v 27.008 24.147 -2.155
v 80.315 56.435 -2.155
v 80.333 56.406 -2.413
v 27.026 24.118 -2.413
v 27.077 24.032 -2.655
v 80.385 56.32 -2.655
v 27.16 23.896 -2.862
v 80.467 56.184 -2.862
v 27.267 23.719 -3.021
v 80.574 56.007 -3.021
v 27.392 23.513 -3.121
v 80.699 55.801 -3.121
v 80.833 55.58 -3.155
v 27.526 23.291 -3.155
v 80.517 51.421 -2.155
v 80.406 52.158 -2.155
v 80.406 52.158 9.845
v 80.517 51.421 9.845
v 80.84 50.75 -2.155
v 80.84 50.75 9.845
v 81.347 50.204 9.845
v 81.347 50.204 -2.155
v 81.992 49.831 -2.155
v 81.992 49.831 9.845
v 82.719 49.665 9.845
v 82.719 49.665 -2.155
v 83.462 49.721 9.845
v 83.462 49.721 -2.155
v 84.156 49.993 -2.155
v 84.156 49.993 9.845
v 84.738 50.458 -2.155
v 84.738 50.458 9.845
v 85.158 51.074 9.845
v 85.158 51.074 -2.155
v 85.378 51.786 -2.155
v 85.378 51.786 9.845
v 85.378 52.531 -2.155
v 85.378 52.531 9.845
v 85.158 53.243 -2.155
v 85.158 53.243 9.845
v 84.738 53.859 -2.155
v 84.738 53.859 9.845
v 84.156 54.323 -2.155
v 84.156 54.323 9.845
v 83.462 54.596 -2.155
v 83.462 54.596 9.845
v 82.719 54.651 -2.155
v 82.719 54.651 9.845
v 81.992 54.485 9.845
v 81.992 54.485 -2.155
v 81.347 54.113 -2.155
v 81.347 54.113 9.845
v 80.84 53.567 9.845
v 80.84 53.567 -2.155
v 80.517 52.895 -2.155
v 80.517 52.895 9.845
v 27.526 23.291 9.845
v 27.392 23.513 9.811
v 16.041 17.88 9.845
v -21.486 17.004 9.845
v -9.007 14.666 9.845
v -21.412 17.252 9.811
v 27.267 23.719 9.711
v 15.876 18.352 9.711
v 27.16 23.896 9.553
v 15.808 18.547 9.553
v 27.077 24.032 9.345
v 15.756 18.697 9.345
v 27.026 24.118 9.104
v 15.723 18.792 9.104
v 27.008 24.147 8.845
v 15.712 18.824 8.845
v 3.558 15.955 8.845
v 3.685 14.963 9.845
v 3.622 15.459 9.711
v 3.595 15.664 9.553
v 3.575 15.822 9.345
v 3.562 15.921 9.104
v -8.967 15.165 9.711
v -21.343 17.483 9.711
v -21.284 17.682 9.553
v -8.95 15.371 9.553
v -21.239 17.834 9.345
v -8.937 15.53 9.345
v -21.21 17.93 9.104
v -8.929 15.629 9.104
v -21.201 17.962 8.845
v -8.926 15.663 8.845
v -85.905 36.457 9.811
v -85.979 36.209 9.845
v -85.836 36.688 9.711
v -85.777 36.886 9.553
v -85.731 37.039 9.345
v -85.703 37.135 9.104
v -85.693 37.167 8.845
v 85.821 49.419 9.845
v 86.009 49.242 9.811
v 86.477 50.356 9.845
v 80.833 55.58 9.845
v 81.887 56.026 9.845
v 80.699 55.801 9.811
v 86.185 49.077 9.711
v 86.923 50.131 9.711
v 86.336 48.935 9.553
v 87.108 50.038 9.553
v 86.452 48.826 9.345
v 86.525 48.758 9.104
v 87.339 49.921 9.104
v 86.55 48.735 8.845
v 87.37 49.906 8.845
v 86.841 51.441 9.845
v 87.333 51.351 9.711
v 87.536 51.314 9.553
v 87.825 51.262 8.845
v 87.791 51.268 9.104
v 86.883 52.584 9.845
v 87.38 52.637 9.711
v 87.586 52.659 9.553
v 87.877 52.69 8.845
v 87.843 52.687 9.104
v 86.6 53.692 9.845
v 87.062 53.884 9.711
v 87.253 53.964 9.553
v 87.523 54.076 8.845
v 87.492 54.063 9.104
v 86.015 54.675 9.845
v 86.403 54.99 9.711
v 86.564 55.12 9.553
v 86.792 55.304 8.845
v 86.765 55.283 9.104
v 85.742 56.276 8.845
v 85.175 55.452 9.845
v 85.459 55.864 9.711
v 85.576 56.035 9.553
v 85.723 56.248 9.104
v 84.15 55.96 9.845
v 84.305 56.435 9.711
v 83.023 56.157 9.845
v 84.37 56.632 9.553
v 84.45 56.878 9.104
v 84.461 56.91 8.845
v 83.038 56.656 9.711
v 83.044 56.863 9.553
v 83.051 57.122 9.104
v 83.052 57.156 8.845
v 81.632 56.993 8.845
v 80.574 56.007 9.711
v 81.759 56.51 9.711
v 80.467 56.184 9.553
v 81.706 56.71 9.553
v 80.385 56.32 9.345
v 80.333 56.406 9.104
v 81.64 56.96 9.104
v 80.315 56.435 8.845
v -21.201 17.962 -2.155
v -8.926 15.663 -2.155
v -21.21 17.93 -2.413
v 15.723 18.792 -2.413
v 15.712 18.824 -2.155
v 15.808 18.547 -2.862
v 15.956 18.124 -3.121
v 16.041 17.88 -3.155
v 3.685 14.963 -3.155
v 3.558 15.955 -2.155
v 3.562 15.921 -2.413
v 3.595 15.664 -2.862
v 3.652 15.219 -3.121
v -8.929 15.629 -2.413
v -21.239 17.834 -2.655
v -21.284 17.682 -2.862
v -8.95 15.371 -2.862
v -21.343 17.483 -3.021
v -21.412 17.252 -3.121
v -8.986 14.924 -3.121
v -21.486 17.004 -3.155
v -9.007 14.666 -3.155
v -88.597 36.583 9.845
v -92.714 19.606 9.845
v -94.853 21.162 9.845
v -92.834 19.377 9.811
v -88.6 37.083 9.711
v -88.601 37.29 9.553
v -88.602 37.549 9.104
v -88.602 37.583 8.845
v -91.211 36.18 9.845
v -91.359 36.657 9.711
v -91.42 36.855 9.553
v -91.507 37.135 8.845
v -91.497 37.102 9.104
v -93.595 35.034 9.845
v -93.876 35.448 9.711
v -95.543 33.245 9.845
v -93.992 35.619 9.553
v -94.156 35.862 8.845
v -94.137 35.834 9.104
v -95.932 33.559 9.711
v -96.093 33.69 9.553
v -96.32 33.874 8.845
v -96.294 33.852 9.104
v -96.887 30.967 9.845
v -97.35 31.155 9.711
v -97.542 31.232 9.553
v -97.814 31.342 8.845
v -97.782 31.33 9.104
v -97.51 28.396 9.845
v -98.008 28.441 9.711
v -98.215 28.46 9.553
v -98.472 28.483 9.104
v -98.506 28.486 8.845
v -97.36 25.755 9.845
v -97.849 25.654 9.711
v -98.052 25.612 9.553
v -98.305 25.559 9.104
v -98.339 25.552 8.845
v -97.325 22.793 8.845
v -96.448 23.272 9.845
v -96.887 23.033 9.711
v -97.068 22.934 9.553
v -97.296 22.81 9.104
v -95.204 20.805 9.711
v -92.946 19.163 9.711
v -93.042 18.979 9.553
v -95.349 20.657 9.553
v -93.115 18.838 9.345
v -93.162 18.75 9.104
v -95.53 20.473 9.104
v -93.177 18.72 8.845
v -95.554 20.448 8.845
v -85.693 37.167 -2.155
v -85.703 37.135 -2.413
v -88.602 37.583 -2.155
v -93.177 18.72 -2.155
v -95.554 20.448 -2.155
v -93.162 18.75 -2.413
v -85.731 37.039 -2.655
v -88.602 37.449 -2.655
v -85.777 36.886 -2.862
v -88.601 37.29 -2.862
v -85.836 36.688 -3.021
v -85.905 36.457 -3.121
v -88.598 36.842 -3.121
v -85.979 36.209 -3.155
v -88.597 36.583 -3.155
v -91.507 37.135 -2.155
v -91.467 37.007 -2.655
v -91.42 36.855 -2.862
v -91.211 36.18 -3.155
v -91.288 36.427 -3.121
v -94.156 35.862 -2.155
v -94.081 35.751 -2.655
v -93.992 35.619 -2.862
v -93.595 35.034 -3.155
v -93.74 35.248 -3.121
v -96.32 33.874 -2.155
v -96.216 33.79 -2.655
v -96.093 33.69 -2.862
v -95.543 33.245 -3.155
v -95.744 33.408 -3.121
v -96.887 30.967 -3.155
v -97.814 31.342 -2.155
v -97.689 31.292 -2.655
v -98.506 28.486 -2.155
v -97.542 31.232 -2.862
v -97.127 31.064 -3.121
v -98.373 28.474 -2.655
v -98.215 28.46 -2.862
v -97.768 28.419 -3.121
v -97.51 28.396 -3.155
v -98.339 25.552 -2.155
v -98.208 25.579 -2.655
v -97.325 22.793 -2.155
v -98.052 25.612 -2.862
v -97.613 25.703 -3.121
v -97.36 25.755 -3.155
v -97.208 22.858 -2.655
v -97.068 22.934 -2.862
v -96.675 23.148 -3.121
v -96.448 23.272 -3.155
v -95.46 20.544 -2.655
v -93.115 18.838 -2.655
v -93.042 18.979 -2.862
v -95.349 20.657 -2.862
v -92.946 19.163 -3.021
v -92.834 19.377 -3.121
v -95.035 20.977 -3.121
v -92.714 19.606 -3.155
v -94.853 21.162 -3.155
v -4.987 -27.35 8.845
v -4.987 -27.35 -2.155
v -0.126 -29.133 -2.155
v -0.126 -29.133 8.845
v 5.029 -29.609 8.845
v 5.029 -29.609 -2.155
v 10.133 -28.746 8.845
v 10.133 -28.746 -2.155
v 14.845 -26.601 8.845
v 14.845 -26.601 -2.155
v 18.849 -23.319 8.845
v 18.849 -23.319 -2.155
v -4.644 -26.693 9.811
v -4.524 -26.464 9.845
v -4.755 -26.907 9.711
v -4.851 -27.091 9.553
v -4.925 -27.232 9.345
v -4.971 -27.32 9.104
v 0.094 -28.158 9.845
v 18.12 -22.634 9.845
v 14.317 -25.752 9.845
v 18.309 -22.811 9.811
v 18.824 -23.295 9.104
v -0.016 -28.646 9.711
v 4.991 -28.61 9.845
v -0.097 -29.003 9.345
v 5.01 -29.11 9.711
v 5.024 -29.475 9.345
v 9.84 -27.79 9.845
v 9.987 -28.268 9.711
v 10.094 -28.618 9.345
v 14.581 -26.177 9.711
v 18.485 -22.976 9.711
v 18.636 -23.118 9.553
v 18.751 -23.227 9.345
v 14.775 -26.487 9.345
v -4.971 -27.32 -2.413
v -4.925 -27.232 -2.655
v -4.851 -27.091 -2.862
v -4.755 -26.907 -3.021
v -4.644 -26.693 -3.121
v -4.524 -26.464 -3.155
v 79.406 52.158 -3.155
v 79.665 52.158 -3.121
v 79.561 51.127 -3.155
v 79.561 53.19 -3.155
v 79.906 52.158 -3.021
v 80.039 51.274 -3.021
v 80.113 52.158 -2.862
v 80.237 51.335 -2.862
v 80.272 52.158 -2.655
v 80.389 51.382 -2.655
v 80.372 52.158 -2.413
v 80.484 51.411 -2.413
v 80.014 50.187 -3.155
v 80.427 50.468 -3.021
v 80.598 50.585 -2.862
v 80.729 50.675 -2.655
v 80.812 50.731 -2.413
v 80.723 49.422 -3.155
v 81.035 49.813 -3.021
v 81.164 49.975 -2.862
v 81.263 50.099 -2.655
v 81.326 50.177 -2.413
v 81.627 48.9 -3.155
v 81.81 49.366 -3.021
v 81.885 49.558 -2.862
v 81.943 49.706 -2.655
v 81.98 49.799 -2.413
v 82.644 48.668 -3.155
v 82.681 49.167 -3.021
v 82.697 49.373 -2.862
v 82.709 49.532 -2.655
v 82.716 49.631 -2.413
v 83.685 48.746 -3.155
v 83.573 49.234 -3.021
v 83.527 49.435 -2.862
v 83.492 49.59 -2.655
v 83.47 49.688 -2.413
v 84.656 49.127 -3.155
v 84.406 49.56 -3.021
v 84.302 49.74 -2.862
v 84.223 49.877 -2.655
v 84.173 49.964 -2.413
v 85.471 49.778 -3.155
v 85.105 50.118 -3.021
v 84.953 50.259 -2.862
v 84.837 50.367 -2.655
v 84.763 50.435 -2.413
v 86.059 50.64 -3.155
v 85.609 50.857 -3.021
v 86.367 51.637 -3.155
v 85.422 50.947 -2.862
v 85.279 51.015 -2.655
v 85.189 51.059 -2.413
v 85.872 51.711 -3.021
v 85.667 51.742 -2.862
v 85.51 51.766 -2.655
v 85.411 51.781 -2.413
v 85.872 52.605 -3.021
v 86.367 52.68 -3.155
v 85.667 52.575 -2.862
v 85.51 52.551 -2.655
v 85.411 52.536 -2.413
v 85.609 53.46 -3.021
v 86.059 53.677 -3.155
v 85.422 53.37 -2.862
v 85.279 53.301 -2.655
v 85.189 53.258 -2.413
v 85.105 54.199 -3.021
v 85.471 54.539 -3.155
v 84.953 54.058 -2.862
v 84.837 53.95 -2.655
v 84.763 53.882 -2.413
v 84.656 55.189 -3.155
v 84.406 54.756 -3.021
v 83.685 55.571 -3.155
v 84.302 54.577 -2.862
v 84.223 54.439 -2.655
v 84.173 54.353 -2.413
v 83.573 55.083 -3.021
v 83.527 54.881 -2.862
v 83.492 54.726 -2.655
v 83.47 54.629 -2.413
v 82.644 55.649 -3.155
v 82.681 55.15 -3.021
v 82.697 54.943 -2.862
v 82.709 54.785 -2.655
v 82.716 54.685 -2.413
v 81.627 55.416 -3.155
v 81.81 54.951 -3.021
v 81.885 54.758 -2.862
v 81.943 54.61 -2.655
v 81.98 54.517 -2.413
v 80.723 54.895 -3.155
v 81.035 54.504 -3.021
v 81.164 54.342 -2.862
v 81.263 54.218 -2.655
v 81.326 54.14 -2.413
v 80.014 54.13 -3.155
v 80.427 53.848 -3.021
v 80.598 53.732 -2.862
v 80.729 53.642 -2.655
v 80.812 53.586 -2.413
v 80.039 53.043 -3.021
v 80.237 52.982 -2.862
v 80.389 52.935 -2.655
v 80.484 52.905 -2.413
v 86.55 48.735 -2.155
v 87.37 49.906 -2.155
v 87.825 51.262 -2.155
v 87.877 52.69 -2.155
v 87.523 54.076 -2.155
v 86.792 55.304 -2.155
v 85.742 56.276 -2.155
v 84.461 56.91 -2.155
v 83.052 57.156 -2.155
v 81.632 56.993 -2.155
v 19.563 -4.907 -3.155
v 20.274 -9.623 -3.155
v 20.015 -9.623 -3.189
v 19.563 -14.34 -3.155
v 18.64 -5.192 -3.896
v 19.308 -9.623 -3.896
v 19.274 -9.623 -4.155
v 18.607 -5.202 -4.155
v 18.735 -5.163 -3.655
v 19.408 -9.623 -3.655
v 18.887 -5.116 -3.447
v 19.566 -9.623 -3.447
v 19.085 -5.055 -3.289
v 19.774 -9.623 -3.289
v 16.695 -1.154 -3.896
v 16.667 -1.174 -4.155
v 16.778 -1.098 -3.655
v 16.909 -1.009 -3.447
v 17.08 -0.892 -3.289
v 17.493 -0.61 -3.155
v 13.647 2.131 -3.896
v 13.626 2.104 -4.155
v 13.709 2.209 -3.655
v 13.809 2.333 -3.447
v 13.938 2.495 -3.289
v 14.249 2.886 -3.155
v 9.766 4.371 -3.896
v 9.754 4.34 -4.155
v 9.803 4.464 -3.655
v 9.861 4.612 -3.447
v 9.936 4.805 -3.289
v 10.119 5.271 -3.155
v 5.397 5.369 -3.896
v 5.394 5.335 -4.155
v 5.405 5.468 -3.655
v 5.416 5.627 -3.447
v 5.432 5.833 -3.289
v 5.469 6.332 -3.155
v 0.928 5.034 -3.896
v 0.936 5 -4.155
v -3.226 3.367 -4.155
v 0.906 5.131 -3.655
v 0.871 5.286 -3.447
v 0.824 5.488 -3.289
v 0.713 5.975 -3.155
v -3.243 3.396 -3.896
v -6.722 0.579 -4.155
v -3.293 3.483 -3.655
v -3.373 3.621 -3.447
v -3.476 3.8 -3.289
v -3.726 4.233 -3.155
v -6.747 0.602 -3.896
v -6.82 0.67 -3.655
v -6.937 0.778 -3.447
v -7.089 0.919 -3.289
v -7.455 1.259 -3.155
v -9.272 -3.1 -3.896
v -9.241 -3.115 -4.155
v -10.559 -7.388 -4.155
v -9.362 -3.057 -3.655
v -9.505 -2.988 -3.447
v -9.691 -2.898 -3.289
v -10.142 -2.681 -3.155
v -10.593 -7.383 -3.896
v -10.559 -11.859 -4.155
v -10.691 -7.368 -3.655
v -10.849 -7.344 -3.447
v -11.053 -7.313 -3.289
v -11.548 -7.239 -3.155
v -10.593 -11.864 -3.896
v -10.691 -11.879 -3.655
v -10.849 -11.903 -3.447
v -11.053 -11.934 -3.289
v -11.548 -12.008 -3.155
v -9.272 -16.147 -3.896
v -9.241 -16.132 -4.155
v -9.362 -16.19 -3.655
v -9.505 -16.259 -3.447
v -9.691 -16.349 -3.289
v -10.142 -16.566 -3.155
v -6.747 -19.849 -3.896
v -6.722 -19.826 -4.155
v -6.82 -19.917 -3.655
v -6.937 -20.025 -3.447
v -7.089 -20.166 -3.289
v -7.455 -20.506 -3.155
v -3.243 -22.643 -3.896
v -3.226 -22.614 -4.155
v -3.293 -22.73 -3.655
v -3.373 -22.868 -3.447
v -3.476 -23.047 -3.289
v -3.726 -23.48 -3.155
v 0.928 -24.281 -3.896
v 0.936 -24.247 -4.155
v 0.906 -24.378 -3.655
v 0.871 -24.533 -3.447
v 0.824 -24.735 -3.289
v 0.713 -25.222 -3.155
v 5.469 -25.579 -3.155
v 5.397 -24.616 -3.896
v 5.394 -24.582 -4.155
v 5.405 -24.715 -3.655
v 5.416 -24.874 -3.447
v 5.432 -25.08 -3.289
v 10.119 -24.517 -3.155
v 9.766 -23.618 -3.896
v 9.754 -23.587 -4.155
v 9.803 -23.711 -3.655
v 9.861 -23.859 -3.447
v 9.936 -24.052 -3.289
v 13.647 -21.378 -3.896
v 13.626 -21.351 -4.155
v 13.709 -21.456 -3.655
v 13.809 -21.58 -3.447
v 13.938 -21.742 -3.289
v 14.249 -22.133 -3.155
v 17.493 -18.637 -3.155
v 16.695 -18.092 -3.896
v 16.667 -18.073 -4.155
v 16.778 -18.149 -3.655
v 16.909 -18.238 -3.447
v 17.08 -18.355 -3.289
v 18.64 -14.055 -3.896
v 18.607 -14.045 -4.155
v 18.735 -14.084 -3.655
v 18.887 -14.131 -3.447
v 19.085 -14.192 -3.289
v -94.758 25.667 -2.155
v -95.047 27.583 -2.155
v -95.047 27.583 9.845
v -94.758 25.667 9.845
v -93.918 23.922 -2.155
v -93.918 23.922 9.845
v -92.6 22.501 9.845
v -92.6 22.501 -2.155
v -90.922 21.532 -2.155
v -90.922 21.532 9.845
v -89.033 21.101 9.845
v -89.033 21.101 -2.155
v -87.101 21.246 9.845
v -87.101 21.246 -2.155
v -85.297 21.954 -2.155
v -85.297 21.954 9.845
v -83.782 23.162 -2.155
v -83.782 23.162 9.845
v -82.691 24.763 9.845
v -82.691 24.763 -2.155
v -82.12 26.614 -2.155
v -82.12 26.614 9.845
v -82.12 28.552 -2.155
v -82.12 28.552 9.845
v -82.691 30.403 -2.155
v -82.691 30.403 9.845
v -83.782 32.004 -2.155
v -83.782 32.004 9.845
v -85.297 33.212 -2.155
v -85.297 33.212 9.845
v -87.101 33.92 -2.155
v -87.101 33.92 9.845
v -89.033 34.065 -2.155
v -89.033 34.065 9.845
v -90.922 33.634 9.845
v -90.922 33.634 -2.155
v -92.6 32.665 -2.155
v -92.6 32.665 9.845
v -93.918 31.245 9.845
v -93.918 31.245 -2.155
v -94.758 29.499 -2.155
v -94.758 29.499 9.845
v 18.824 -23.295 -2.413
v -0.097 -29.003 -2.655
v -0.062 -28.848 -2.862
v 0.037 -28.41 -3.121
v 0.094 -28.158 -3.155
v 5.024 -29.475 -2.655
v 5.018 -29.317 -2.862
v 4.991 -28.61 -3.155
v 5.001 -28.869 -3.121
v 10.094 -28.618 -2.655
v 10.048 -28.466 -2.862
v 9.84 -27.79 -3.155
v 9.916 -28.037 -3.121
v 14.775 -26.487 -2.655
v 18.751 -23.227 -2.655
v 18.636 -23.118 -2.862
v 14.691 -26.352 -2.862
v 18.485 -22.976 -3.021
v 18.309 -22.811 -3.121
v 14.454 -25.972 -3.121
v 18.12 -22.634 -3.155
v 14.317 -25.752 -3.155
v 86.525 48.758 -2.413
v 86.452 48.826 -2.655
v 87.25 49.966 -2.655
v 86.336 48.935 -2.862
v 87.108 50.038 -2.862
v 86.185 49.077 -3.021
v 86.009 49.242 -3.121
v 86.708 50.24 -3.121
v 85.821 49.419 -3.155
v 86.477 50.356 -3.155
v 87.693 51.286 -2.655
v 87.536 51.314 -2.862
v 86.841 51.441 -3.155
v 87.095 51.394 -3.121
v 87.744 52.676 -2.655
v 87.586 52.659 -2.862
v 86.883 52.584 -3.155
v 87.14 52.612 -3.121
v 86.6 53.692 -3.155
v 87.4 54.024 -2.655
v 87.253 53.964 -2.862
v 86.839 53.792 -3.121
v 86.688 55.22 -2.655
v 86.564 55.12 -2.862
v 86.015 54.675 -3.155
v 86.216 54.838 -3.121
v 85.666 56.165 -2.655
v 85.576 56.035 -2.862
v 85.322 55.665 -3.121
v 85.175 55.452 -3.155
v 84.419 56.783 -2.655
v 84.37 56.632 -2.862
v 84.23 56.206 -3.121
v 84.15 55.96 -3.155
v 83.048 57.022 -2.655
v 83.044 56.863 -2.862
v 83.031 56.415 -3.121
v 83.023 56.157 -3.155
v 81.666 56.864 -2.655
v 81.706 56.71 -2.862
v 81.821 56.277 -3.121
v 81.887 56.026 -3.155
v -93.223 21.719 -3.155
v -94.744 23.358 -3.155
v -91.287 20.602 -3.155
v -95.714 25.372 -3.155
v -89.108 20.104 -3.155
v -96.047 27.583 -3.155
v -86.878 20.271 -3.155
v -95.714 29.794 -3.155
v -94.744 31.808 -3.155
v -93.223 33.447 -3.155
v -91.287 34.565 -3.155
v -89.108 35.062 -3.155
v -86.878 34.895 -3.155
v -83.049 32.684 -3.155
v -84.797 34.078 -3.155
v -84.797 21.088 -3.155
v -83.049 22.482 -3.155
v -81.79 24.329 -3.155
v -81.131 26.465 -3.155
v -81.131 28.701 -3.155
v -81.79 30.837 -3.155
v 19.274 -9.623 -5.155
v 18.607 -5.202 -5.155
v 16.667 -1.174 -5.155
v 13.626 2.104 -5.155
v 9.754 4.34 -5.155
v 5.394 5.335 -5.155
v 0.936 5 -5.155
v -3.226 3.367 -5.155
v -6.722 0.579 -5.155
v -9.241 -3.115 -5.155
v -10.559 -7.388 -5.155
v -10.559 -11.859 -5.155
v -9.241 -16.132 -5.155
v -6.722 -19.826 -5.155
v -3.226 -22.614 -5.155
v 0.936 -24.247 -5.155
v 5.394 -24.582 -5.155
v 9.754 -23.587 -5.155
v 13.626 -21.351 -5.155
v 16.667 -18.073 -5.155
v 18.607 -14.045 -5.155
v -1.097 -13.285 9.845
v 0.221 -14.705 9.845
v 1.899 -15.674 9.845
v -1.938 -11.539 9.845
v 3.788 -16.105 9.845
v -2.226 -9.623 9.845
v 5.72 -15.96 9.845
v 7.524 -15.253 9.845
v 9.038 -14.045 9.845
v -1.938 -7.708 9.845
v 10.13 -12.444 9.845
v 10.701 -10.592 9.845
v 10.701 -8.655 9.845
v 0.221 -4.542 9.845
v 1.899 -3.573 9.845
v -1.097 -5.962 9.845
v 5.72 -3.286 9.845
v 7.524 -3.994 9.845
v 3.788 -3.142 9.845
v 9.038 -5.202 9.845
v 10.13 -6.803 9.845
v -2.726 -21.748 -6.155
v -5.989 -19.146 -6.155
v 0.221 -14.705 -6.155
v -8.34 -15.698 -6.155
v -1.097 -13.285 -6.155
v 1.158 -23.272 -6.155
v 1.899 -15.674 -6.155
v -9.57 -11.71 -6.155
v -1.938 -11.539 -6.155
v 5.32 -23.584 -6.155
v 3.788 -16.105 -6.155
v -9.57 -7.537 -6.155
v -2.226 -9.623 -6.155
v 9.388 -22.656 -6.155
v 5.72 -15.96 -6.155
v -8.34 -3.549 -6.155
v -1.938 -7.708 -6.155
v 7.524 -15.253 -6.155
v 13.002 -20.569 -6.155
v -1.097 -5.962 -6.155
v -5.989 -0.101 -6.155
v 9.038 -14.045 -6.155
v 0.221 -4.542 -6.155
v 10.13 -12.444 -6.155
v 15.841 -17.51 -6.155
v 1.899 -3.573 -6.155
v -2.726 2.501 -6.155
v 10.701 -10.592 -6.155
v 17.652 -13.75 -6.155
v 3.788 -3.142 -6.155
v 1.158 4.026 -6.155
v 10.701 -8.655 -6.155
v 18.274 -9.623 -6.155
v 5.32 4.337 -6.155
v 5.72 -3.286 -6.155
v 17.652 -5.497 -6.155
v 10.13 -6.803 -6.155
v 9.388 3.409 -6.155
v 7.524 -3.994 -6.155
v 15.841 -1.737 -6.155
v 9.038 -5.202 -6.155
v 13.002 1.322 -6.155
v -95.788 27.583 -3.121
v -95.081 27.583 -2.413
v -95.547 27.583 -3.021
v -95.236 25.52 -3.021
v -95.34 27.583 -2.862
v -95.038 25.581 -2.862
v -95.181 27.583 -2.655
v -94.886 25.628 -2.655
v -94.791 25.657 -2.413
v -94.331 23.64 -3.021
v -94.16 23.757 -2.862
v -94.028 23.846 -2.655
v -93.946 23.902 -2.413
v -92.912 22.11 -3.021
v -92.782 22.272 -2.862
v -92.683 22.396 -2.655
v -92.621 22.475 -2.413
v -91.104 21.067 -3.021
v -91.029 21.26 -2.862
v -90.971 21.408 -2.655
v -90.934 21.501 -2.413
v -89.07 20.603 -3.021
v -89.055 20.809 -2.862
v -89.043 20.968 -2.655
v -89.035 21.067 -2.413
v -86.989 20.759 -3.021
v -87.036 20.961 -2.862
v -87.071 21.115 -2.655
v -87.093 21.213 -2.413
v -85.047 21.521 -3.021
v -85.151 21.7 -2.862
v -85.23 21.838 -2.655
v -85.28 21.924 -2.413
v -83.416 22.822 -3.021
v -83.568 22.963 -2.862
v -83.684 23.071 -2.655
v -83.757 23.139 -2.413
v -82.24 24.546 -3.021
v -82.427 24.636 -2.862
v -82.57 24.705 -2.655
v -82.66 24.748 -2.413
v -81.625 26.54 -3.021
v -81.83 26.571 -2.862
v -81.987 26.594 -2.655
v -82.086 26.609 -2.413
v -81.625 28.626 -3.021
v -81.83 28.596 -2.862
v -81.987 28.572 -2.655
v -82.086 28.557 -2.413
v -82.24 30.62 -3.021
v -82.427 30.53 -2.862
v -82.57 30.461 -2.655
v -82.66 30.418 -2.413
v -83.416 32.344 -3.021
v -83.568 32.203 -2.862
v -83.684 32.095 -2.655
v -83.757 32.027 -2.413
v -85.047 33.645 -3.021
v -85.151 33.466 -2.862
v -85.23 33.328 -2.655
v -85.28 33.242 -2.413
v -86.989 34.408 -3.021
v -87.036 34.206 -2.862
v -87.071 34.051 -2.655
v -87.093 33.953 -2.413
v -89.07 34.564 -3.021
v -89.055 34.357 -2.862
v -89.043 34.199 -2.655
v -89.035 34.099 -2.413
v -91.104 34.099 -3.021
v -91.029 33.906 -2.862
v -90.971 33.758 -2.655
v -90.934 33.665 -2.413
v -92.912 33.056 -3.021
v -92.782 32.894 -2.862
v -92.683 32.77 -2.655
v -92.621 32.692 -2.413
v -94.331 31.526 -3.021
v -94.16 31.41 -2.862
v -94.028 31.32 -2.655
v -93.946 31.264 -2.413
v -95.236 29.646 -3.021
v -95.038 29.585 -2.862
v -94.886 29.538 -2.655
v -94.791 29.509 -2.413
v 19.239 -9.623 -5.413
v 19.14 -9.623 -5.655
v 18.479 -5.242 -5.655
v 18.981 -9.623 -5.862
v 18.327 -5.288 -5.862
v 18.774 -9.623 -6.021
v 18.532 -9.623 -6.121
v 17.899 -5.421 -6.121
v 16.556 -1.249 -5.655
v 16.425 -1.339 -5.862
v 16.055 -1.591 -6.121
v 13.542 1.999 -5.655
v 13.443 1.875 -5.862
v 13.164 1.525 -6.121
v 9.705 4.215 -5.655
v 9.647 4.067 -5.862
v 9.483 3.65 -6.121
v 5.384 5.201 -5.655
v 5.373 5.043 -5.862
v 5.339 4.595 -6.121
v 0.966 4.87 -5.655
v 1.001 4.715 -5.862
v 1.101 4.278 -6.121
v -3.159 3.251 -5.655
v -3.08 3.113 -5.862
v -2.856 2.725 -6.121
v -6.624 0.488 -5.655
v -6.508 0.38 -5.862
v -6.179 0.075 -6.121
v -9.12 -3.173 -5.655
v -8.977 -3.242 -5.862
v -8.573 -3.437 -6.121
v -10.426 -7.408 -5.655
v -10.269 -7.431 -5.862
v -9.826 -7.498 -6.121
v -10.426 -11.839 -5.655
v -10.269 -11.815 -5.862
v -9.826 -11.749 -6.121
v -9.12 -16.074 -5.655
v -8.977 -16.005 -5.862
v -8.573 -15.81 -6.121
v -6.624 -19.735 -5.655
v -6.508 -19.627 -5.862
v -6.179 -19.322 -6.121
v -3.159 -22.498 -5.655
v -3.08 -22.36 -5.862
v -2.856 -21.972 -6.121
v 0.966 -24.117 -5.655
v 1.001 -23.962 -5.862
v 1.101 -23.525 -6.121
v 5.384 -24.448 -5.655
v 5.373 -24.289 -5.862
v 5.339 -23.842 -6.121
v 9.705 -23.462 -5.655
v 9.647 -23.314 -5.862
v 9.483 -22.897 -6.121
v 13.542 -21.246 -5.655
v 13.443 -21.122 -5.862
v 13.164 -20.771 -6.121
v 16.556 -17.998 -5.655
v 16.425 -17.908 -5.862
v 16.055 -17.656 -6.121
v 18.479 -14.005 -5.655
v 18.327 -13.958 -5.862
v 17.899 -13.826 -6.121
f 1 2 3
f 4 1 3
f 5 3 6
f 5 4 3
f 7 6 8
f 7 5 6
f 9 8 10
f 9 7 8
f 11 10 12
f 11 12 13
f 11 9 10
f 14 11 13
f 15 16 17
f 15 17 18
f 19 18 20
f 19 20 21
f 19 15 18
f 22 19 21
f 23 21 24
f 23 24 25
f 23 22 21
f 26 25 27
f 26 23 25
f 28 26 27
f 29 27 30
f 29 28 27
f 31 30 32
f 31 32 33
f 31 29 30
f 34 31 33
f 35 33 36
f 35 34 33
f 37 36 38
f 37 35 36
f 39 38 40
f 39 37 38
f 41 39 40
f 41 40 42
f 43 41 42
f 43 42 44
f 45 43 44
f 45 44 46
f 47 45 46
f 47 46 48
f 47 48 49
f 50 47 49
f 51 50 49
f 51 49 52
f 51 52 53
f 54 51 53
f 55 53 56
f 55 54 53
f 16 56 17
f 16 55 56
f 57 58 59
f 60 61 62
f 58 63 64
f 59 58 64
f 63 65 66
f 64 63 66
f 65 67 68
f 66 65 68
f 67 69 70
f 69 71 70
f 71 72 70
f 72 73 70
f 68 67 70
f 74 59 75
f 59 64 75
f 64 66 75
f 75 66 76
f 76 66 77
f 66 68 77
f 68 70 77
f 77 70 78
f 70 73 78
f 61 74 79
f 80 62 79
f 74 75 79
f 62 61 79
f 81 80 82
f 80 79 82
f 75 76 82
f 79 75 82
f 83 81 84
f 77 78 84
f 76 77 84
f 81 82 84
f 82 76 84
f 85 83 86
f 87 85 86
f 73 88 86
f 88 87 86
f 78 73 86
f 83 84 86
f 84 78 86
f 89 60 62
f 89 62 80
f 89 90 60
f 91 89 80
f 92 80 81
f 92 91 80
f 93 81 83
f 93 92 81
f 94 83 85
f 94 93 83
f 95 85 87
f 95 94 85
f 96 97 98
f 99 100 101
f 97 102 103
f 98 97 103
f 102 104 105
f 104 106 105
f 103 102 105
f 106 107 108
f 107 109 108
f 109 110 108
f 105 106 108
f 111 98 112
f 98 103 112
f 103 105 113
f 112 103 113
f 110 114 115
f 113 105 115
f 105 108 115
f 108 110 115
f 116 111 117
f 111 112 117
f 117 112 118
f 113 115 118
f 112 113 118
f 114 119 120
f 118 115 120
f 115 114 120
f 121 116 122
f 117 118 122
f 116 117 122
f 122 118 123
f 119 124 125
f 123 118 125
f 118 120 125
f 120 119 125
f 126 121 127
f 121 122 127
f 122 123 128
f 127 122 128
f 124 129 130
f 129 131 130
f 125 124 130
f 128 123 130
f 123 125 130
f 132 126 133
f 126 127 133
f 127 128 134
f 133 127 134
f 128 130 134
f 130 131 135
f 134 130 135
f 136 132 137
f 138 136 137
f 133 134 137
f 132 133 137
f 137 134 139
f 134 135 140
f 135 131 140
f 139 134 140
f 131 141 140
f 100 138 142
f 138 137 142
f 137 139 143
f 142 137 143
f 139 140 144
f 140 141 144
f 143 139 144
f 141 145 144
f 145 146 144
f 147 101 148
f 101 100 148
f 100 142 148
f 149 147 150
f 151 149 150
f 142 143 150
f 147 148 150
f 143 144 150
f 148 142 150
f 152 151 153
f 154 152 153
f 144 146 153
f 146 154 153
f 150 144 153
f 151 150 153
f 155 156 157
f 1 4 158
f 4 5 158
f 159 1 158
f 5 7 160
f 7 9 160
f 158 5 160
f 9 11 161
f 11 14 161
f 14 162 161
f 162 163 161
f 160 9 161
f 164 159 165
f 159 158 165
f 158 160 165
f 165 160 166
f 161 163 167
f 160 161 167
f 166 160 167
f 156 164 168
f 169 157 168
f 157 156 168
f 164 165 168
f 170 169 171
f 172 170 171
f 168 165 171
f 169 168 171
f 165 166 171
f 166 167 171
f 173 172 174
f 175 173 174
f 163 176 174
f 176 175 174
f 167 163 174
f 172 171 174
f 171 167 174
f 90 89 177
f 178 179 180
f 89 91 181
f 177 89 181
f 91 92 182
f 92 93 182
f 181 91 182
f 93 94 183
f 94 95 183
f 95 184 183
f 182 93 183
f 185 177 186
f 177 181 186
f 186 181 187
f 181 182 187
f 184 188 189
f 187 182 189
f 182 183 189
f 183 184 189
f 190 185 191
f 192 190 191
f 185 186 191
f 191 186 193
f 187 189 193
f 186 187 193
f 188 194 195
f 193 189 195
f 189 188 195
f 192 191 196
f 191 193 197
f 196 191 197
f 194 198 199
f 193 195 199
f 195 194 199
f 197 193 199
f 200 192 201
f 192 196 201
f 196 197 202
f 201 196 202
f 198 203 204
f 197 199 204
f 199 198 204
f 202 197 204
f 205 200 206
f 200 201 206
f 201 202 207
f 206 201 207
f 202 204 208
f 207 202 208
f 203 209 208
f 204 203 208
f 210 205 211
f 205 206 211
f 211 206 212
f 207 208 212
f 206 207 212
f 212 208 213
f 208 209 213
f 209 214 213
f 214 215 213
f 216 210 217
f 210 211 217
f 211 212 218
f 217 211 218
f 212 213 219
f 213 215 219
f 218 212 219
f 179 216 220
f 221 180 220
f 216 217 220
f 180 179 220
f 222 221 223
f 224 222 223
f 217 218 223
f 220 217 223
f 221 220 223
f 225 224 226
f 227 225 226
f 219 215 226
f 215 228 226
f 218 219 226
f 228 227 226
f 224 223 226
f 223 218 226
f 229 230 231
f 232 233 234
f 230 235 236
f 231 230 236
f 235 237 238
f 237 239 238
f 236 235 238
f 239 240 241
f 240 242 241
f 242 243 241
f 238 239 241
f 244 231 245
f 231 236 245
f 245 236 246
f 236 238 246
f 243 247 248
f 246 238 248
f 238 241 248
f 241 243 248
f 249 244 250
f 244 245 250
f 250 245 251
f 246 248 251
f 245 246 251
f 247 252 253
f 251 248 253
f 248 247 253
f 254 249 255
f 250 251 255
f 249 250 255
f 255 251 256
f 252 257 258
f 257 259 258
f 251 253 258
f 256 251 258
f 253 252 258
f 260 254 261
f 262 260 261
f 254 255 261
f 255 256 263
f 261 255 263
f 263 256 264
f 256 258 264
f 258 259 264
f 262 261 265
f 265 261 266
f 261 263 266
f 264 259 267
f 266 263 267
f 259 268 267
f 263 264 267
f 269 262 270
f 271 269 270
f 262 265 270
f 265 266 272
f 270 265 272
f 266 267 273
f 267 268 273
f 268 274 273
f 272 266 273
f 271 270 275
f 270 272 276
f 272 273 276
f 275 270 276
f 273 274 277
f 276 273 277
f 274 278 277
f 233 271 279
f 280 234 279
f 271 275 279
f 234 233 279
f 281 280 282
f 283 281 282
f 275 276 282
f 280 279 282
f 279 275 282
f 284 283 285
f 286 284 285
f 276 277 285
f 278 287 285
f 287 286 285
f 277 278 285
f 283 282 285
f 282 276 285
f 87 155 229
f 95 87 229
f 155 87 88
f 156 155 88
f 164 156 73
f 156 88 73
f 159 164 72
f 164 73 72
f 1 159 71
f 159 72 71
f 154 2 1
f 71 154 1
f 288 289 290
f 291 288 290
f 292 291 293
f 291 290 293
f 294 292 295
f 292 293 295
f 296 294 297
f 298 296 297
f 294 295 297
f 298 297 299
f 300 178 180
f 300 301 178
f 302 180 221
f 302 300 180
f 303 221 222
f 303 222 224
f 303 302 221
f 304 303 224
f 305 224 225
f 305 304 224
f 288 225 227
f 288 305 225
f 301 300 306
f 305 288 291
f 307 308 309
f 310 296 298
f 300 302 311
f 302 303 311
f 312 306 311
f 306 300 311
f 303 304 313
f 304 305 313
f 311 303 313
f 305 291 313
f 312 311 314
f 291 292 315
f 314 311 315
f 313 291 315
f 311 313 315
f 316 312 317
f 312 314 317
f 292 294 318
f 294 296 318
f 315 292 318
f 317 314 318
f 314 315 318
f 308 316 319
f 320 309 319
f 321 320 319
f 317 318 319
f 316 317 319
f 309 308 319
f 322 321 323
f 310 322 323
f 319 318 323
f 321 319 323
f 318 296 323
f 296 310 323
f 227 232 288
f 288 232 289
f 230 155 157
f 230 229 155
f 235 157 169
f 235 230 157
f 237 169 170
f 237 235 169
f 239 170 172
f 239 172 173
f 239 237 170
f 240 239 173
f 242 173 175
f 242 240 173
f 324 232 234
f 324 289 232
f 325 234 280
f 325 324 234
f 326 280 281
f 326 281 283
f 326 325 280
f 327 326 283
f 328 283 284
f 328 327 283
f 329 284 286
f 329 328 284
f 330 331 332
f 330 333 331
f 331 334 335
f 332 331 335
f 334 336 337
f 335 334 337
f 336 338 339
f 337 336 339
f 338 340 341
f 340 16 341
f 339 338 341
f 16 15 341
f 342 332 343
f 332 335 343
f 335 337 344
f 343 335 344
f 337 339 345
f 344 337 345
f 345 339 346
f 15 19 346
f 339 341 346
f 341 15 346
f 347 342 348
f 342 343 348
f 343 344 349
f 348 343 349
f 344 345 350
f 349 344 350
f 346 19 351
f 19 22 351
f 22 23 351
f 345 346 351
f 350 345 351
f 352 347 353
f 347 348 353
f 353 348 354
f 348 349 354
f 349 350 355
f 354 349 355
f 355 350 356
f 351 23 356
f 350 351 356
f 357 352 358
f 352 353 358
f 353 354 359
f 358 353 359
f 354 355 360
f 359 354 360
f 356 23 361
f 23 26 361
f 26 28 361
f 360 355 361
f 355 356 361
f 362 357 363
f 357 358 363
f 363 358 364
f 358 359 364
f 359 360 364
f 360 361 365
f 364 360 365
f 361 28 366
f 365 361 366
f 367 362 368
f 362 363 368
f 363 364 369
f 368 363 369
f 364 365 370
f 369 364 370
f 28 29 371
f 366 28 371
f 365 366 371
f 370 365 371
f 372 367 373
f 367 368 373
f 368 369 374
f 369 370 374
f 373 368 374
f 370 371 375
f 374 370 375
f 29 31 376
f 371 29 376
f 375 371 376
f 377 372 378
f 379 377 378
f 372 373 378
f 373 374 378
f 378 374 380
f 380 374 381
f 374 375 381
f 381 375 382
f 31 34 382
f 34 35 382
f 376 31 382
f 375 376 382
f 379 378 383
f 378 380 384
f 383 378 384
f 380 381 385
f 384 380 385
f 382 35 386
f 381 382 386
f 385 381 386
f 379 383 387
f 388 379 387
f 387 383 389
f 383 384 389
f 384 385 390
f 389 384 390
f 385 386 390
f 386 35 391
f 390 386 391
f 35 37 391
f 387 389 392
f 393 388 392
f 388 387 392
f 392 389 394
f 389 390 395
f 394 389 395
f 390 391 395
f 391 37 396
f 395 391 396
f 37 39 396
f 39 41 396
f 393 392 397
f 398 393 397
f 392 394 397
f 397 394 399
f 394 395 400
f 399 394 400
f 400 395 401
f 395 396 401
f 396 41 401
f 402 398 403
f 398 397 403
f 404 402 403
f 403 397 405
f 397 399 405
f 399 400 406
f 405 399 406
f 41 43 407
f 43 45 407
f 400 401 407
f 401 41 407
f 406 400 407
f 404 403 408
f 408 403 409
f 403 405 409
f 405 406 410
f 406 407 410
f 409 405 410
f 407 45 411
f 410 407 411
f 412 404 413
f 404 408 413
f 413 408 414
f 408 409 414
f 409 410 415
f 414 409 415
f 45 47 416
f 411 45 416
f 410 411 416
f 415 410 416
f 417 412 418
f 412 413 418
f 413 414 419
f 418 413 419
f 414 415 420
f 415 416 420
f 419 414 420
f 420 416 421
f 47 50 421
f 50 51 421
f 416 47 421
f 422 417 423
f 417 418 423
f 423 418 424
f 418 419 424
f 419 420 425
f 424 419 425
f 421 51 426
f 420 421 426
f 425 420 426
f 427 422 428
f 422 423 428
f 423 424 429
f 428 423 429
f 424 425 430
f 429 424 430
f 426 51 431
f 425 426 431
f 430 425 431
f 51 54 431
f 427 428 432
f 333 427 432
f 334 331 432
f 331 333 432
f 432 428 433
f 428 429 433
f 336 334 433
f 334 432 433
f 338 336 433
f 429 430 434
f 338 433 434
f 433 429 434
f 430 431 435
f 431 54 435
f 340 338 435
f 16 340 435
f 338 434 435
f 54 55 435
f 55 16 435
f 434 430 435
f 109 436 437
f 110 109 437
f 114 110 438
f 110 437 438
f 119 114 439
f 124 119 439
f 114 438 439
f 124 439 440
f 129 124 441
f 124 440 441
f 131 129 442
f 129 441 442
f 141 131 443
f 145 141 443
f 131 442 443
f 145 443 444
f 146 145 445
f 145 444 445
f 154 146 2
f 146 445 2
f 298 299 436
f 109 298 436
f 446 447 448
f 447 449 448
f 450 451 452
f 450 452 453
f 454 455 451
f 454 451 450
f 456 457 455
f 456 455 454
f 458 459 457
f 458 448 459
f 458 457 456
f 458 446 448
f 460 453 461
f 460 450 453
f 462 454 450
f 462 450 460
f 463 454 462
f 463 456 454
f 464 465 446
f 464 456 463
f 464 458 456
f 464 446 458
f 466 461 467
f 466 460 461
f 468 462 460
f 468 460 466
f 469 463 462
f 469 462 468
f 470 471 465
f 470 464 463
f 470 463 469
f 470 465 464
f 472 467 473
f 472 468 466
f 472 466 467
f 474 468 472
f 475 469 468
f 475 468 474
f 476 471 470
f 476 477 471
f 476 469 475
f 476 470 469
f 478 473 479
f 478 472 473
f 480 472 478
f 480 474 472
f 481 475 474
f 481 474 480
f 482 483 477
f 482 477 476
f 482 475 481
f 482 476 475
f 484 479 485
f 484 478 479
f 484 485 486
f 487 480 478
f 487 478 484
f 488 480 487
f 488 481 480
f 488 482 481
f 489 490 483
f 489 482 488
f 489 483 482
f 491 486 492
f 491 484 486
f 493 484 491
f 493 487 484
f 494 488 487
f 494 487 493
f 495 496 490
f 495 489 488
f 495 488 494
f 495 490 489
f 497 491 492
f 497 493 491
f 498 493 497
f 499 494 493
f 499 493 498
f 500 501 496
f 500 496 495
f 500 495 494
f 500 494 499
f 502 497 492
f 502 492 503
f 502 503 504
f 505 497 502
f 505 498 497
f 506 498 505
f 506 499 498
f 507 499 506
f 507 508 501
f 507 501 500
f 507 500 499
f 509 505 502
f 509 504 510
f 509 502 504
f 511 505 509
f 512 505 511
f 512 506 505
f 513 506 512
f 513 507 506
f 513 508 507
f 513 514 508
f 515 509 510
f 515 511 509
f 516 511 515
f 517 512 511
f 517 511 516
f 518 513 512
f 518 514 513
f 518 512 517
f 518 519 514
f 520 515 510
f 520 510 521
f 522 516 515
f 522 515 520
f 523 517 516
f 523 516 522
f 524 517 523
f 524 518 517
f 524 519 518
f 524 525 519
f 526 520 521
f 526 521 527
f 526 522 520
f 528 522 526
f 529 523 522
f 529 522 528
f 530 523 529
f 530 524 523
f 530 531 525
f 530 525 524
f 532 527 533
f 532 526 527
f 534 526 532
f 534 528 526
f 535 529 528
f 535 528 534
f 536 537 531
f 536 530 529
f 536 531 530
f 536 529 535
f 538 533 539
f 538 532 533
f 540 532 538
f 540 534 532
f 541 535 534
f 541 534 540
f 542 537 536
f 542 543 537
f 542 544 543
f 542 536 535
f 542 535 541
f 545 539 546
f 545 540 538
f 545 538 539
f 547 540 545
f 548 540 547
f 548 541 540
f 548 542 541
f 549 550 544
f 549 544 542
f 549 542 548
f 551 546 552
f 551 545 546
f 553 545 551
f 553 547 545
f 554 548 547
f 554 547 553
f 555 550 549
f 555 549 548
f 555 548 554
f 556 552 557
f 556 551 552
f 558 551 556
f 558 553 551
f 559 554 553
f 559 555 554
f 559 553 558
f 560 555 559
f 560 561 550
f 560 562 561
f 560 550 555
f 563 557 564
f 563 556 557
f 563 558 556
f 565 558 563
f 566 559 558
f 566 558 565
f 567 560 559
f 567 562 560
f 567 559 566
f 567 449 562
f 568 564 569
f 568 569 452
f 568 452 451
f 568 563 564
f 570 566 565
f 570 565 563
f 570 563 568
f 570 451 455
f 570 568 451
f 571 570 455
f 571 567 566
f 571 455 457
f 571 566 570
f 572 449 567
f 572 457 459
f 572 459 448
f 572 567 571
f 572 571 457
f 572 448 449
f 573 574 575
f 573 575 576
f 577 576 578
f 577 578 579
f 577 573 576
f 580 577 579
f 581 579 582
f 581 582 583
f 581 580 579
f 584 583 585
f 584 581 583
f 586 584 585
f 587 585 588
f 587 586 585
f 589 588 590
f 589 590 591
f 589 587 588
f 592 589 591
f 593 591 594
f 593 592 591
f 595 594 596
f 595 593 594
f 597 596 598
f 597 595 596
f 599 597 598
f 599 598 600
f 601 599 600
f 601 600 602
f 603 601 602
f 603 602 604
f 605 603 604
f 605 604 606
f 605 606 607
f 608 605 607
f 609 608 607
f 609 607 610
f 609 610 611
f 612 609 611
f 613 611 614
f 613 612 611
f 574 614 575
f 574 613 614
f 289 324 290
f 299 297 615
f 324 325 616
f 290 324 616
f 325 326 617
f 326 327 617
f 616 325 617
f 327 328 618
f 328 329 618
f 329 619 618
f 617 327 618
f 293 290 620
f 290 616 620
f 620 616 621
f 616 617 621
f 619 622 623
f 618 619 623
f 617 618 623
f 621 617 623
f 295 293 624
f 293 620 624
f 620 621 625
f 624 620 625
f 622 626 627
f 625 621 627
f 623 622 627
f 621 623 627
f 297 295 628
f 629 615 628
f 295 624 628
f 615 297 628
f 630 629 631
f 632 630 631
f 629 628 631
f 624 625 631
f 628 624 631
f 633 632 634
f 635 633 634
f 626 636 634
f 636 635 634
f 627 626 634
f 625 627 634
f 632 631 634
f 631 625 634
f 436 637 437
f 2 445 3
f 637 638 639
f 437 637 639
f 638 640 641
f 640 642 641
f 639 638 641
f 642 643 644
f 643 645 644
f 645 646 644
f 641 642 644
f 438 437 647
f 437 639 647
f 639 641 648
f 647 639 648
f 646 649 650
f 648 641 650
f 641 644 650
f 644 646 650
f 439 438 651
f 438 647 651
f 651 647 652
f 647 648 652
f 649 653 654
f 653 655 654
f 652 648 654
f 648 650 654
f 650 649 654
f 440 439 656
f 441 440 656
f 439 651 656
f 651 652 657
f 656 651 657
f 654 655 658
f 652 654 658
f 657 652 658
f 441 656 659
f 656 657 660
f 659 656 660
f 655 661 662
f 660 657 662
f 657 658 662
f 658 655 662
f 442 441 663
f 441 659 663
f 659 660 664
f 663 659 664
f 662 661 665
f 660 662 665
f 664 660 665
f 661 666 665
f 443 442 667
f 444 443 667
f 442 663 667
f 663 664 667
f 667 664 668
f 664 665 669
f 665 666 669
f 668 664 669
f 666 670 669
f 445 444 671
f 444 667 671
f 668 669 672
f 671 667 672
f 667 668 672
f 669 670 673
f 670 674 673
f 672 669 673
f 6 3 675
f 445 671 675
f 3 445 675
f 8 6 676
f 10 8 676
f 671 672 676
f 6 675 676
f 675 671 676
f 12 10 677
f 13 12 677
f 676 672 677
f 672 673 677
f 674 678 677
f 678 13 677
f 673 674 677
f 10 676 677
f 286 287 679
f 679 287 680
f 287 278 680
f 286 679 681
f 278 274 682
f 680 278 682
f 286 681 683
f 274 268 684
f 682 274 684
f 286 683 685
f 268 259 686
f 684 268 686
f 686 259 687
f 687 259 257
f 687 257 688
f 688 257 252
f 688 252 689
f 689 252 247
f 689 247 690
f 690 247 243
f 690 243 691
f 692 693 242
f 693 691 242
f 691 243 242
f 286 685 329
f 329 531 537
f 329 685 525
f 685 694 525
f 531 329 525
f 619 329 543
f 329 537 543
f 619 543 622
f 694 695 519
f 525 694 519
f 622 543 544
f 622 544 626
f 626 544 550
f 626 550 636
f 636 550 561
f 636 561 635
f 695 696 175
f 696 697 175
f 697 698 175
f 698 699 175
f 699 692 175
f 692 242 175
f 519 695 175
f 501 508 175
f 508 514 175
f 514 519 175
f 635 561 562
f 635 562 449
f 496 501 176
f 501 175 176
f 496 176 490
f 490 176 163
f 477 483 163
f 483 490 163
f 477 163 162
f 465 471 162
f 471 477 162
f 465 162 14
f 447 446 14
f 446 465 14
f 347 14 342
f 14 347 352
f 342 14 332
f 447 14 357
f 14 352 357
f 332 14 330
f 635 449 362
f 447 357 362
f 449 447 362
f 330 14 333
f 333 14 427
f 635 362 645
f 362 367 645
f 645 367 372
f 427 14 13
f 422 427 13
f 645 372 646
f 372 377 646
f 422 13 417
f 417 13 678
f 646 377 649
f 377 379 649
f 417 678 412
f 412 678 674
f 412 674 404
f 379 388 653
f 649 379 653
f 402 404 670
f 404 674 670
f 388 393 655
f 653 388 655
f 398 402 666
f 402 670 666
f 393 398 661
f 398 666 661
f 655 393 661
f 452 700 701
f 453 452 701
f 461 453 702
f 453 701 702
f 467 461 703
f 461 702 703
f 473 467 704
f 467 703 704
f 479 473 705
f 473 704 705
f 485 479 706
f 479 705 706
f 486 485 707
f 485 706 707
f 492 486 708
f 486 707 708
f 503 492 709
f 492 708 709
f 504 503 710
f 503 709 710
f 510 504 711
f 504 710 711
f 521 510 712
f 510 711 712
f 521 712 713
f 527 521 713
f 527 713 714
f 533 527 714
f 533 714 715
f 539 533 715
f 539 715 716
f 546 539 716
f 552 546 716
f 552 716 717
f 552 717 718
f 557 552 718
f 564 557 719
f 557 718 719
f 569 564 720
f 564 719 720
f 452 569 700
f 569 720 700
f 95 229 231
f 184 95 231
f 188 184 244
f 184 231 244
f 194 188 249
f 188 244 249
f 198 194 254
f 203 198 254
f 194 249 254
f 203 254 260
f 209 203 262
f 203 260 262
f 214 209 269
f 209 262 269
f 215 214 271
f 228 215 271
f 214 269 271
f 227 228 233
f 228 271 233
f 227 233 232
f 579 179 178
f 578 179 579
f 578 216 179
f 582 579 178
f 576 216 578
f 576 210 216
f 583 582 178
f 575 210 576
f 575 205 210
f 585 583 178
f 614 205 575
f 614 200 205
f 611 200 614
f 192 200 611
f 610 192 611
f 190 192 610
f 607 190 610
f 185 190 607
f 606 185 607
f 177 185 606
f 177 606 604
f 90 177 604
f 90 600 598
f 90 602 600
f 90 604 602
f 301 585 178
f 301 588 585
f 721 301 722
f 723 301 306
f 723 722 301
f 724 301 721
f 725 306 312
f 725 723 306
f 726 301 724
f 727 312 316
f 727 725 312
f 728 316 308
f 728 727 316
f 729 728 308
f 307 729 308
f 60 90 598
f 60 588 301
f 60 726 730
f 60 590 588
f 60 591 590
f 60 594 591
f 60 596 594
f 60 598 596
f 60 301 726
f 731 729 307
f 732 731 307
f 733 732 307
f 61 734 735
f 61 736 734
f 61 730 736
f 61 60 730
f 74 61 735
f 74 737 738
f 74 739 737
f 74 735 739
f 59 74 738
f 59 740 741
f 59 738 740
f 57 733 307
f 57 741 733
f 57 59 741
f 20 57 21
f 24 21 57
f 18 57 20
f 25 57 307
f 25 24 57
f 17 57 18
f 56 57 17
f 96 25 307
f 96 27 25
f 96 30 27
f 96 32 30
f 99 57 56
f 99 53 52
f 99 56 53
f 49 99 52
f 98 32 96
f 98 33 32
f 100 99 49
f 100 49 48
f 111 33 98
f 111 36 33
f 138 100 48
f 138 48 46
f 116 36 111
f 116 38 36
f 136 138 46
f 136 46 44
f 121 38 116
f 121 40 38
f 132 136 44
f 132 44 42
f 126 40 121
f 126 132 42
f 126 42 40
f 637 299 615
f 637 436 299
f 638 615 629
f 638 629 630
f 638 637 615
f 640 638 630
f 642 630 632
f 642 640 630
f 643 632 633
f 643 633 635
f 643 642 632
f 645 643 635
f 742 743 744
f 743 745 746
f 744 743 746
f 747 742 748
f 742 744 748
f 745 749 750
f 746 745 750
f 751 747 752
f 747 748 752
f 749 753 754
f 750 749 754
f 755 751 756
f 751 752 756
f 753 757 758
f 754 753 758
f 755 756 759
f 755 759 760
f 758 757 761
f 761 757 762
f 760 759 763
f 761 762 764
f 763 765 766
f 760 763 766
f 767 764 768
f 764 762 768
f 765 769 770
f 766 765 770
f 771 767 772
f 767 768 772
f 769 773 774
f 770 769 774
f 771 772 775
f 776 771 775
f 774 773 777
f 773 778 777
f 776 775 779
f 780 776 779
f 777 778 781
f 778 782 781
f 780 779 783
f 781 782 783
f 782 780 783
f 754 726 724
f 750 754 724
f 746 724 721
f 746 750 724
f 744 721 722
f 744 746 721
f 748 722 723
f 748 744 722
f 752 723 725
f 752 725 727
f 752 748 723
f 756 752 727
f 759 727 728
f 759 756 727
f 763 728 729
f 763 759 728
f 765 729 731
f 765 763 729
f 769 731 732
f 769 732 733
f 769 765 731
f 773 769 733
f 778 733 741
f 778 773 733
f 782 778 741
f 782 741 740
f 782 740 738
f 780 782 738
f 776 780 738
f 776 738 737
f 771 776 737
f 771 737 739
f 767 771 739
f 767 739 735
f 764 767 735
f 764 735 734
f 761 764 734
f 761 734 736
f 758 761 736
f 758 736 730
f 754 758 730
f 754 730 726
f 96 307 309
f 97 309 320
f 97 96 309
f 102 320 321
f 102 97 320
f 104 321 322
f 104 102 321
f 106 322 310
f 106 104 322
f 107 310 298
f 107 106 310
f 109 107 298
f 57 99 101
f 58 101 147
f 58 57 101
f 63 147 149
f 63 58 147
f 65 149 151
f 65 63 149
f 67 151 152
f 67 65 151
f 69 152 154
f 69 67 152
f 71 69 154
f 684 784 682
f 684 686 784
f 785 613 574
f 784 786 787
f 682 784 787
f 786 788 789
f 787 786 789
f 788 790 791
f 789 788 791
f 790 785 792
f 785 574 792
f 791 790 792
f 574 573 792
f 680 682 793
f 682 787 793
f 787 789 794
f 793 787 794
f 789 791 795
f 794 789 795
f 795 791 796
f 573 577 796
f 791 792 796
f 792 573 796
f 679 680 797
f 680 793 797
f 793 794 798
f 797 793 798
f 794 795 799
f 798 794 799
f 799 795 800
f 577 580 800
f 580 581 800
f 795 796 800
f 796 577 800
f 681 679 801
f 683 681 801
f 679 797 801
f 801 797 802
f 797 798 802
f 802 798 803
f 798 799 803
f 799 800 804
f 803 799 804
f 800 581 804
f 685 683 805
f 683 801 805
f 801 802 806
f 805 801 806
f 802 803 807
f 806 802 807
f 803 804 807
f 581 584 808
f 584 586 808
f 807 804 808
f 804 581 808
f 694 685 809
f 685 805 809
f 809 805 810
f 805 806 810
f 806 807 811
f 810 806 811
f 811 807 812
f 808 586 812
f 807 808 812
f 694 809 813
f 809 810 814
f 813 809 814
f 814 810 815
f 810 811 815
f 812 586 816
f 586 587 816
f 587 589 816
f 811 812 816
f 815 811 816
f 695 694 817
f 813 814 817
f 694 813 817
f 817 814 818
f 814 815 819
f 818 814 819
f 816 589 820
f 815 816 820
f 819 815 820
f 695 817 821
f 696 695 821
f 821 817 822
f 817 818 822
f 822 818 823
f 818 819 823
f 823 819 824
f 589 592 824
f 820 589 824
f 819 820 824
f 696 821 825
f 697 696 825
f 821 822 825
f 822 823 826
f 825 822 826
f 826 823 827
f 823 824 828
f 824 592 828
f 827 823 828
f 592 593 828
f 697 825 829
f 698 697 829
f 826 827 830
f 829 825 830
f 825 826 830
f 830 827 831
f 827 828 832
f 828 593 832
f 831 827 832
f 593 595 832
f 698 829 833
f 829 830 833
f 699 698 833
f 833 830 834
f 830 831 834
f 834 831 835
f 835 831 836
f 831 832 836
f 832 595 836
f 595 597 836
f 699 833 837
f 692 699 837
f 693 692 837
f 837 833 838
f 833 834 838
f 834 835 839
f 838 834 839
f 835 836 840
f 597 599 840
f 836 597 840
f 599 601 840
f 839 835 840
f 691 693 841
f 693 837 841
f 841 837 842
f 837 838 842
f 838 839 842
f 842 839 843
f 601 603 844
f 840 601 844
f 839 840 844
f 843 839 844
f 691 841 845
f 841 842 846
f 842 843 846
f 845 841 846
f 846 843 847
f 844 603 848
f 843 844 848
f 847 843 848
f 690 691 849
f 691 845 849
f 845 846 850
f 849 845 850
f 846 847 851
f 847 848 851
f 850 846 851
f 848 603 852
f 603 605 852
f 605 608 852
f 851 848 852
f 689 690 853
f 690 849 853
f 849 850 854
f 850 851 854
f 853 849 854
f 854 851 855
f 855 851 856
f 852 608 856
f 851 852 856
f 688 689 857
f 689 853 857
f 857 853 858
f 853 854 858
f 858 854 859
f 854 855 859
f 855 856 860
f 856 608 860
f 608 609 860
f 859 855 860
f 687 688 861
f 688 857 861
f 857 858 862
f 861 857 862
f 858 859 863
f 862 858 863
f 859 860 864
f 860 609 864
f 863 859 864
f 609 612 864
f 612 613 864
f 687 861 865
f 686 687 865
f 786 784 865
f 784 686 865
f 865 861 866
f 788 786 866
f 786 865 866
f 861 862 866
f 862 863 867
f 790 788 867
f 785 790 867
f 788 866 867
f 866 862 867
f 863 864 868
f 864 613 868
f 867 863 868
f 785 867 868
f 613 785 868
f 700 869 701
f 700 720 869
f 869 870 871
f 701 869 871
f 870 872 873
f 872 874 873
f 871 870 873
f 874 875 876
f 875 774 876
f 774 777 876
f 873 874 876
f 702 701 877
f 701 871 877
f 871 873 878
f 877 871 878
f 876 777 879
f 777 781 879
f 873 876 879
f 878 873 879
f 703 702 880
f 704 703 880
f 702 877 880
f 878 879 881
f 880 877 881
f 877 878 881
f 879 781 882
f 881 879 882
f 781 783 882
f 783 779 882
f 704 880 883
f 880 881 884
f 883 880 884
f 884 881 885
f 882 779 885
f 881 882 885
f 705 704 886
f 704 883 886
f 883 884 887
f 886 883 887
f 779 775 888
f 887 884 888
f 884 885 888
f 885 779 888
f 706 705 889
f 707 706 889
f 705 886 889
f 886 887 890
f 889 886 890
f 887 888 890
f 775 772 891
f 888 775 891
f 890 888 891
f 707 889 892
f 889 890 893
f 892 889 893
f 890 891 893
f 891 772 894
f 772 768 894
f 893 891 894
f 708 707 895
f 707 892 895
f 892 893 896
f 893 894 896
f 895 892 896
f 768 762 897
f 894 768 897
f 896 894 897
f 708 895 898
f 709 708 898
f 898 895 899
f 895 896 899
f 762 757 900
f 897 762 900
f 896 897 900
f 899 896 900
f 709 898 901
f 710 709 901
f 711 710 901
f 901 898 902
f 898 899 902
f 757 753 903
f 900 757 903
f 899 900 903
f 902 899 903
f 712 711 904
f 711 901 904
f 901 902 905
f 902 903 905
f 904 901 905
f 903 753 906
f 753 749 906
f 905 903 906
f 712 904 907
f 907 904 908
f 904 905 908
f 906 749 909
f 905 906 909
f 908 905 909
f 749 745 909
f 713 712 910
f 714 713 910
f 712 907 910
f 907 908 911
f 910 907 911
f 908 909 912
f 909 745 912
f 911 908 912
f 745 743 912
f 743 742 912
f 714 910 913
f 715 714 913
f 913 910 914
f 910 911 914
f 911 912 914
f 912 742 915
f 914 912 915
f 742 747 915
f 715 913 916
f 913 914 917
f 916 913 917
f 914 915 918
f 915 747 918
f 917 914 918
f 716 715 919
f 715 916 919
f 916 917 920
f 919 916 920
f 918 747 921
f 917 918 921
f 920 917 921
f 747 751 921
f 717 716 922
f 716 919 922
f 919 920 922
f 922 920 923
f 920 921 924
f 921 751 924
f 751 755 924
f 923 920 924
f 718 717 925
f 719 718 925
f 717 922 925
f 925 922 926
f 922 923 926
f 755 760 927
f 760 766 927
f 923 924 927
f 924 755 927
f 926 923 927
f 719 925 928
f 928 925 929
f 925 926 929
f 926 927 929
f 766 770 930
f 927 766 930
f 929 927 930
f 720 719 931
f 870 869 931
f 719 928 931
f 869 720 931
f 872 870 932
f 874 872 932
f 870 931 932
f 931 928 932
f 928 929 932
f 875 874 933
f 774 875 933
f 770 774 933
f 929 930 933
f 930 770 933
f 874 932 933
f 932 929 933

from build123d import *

# Parameters (mm, degrees)
SKETCH1_R           = 3.25
SKETCH1_R_2         = 1.25
BOSS_EXTRUDE1_DEPTH = 6.5
FILLET1_R           = 30
FILLET2_R           = 0.5
BOSS_EXTRUDE3_START = -1.5
SKETCH2_R           = 7.5
SKETCH2_R_2         = 3.25
BOSS_EXTRUDE3_DEPTH = 1.5
FILLET3_R           = 0.5
SCALE_1_SCALE       = 2


with BuildPart() as part:
    # Sketch1 → Boss-Extrude1 (new body)
    with BuildSketch(Plane.XY):
        with BuildLine():
            Line((-48.725428782, 14.171541553), (-4.630211955, -8.863472077))
            ThreePointArc((-4.630211955, -8.863472077), (1.667827944, -9.85993661), (7.287758219, -6.847523651))
            Line((7.287758219, -6.847523651), (41.138011945, 29.178998838))
            ThreePointArc((41.138011945, 29.178998838), (41.259114136, 32.463962322), (38.020883424, 33.029216848))
            Line((38.020883424, 33.029216848), (0, 10))
            Line((0, 10), (-44.983328095, 23.395321633))
            ThreePointArc((-44.983328095, 23.395321633), (-51.043541464, 20.482980986), (-48.725428782, 14.171541553))
        make_face()
        with Locations(Location((-46.410322805, 18.603277592, 0), (0, 0, 180))):
            Circle(SKETCH1_R, mode=Mode.SUBTRACT)
        with Locations(Location((39.31607239, 30.890879751, 0), (0, 0, 180))):
            Circle(SKETCH1_R_2, mode=Mode.SUBTRACT)
        with Locations(Location((0, 0, 0), (0, 0, 180))):
            Circle(SKETCH1_R, mode=Mode.SUBTRACT)
    extrude(amount=BOSS_EXTRUDE1_DEPTH)

    # Fillet1
    fillet1_edges = [part.edges().sort_by_distance(p)[0] for p in [
        (0, 10, 3.25),
    ]]
    fillet(fillet1_edges, radius=FILLET1_R)

    # Fillet2
    fillet2_edges = [part.edges().sort_by_distance(p)[0] for p in [
        (1.667827944, -9.85993661, 6.5),
        (24.212885082, 11.165737594, 6.5),
        (41.259114136, 32.463962322, 6.5),
        (24.69404334, 24.957161111, 6.5),
        (-28.860180348, 18.594103961, 0),
        (-28.860180348, 18.594103961, 6.5),
        (-0.3577879, 12.789001585, 0),
        (-0.3577879, 12.789001585, 6.5),
        (-51.043541464, 20.482980986, 6.5),
        (-26.677820368, 2.654034738, 6.5),
        (24.69404334, 24.957161111, 0),
        (41.259114136, 32.463962322, 0),
        (24.212885082, 11.165737594, 0),
        (1.667827944, -9.85993661, 0),
        (-26.677820368, 2.654034738, 0),
        (-51.043541464, 20.482980986, 0),
    ]]
    fillet(fillet2_edges, radius=FILLET2_R)

    # Sketch2 → Boss-Extrude3 (add)
    with BuildSketch(Plane.XY.offset(BOSS_EXTRUDE3_START)):
        Circle(SKETCH2_R)
        with Locations(Location((0, 0, 0), (0, 0, 180))):
            Circle(SKETCH2_R_2, mode=Mode.SUBTRACT)
    extrude(amount=BOSS_EXTRUDE3_DEPTH)

    # Fillet3
    fillet3_edges = [part.edges().sort_by_distance(p)[0] for p in [
        (-43.160322805, 18.603277592, 0),
        (40.56607239, 30.890879751, 0),
        (-7.5, 0, -1.5),
        (-7.5, 0, 0),
    ]]
    fillet(fillet3_edges, radius=FILLET3_R)


with BuildPart() as part_1:
    # 缩放比例1: scaled about (-4.273542233, 9.623468382, 3.154576374)
    add(part.part.scale(SCALE_1_SCALE).moved(Location((4.273542233, -9.623468382, -3.154576374))))


solid = part_1.part
